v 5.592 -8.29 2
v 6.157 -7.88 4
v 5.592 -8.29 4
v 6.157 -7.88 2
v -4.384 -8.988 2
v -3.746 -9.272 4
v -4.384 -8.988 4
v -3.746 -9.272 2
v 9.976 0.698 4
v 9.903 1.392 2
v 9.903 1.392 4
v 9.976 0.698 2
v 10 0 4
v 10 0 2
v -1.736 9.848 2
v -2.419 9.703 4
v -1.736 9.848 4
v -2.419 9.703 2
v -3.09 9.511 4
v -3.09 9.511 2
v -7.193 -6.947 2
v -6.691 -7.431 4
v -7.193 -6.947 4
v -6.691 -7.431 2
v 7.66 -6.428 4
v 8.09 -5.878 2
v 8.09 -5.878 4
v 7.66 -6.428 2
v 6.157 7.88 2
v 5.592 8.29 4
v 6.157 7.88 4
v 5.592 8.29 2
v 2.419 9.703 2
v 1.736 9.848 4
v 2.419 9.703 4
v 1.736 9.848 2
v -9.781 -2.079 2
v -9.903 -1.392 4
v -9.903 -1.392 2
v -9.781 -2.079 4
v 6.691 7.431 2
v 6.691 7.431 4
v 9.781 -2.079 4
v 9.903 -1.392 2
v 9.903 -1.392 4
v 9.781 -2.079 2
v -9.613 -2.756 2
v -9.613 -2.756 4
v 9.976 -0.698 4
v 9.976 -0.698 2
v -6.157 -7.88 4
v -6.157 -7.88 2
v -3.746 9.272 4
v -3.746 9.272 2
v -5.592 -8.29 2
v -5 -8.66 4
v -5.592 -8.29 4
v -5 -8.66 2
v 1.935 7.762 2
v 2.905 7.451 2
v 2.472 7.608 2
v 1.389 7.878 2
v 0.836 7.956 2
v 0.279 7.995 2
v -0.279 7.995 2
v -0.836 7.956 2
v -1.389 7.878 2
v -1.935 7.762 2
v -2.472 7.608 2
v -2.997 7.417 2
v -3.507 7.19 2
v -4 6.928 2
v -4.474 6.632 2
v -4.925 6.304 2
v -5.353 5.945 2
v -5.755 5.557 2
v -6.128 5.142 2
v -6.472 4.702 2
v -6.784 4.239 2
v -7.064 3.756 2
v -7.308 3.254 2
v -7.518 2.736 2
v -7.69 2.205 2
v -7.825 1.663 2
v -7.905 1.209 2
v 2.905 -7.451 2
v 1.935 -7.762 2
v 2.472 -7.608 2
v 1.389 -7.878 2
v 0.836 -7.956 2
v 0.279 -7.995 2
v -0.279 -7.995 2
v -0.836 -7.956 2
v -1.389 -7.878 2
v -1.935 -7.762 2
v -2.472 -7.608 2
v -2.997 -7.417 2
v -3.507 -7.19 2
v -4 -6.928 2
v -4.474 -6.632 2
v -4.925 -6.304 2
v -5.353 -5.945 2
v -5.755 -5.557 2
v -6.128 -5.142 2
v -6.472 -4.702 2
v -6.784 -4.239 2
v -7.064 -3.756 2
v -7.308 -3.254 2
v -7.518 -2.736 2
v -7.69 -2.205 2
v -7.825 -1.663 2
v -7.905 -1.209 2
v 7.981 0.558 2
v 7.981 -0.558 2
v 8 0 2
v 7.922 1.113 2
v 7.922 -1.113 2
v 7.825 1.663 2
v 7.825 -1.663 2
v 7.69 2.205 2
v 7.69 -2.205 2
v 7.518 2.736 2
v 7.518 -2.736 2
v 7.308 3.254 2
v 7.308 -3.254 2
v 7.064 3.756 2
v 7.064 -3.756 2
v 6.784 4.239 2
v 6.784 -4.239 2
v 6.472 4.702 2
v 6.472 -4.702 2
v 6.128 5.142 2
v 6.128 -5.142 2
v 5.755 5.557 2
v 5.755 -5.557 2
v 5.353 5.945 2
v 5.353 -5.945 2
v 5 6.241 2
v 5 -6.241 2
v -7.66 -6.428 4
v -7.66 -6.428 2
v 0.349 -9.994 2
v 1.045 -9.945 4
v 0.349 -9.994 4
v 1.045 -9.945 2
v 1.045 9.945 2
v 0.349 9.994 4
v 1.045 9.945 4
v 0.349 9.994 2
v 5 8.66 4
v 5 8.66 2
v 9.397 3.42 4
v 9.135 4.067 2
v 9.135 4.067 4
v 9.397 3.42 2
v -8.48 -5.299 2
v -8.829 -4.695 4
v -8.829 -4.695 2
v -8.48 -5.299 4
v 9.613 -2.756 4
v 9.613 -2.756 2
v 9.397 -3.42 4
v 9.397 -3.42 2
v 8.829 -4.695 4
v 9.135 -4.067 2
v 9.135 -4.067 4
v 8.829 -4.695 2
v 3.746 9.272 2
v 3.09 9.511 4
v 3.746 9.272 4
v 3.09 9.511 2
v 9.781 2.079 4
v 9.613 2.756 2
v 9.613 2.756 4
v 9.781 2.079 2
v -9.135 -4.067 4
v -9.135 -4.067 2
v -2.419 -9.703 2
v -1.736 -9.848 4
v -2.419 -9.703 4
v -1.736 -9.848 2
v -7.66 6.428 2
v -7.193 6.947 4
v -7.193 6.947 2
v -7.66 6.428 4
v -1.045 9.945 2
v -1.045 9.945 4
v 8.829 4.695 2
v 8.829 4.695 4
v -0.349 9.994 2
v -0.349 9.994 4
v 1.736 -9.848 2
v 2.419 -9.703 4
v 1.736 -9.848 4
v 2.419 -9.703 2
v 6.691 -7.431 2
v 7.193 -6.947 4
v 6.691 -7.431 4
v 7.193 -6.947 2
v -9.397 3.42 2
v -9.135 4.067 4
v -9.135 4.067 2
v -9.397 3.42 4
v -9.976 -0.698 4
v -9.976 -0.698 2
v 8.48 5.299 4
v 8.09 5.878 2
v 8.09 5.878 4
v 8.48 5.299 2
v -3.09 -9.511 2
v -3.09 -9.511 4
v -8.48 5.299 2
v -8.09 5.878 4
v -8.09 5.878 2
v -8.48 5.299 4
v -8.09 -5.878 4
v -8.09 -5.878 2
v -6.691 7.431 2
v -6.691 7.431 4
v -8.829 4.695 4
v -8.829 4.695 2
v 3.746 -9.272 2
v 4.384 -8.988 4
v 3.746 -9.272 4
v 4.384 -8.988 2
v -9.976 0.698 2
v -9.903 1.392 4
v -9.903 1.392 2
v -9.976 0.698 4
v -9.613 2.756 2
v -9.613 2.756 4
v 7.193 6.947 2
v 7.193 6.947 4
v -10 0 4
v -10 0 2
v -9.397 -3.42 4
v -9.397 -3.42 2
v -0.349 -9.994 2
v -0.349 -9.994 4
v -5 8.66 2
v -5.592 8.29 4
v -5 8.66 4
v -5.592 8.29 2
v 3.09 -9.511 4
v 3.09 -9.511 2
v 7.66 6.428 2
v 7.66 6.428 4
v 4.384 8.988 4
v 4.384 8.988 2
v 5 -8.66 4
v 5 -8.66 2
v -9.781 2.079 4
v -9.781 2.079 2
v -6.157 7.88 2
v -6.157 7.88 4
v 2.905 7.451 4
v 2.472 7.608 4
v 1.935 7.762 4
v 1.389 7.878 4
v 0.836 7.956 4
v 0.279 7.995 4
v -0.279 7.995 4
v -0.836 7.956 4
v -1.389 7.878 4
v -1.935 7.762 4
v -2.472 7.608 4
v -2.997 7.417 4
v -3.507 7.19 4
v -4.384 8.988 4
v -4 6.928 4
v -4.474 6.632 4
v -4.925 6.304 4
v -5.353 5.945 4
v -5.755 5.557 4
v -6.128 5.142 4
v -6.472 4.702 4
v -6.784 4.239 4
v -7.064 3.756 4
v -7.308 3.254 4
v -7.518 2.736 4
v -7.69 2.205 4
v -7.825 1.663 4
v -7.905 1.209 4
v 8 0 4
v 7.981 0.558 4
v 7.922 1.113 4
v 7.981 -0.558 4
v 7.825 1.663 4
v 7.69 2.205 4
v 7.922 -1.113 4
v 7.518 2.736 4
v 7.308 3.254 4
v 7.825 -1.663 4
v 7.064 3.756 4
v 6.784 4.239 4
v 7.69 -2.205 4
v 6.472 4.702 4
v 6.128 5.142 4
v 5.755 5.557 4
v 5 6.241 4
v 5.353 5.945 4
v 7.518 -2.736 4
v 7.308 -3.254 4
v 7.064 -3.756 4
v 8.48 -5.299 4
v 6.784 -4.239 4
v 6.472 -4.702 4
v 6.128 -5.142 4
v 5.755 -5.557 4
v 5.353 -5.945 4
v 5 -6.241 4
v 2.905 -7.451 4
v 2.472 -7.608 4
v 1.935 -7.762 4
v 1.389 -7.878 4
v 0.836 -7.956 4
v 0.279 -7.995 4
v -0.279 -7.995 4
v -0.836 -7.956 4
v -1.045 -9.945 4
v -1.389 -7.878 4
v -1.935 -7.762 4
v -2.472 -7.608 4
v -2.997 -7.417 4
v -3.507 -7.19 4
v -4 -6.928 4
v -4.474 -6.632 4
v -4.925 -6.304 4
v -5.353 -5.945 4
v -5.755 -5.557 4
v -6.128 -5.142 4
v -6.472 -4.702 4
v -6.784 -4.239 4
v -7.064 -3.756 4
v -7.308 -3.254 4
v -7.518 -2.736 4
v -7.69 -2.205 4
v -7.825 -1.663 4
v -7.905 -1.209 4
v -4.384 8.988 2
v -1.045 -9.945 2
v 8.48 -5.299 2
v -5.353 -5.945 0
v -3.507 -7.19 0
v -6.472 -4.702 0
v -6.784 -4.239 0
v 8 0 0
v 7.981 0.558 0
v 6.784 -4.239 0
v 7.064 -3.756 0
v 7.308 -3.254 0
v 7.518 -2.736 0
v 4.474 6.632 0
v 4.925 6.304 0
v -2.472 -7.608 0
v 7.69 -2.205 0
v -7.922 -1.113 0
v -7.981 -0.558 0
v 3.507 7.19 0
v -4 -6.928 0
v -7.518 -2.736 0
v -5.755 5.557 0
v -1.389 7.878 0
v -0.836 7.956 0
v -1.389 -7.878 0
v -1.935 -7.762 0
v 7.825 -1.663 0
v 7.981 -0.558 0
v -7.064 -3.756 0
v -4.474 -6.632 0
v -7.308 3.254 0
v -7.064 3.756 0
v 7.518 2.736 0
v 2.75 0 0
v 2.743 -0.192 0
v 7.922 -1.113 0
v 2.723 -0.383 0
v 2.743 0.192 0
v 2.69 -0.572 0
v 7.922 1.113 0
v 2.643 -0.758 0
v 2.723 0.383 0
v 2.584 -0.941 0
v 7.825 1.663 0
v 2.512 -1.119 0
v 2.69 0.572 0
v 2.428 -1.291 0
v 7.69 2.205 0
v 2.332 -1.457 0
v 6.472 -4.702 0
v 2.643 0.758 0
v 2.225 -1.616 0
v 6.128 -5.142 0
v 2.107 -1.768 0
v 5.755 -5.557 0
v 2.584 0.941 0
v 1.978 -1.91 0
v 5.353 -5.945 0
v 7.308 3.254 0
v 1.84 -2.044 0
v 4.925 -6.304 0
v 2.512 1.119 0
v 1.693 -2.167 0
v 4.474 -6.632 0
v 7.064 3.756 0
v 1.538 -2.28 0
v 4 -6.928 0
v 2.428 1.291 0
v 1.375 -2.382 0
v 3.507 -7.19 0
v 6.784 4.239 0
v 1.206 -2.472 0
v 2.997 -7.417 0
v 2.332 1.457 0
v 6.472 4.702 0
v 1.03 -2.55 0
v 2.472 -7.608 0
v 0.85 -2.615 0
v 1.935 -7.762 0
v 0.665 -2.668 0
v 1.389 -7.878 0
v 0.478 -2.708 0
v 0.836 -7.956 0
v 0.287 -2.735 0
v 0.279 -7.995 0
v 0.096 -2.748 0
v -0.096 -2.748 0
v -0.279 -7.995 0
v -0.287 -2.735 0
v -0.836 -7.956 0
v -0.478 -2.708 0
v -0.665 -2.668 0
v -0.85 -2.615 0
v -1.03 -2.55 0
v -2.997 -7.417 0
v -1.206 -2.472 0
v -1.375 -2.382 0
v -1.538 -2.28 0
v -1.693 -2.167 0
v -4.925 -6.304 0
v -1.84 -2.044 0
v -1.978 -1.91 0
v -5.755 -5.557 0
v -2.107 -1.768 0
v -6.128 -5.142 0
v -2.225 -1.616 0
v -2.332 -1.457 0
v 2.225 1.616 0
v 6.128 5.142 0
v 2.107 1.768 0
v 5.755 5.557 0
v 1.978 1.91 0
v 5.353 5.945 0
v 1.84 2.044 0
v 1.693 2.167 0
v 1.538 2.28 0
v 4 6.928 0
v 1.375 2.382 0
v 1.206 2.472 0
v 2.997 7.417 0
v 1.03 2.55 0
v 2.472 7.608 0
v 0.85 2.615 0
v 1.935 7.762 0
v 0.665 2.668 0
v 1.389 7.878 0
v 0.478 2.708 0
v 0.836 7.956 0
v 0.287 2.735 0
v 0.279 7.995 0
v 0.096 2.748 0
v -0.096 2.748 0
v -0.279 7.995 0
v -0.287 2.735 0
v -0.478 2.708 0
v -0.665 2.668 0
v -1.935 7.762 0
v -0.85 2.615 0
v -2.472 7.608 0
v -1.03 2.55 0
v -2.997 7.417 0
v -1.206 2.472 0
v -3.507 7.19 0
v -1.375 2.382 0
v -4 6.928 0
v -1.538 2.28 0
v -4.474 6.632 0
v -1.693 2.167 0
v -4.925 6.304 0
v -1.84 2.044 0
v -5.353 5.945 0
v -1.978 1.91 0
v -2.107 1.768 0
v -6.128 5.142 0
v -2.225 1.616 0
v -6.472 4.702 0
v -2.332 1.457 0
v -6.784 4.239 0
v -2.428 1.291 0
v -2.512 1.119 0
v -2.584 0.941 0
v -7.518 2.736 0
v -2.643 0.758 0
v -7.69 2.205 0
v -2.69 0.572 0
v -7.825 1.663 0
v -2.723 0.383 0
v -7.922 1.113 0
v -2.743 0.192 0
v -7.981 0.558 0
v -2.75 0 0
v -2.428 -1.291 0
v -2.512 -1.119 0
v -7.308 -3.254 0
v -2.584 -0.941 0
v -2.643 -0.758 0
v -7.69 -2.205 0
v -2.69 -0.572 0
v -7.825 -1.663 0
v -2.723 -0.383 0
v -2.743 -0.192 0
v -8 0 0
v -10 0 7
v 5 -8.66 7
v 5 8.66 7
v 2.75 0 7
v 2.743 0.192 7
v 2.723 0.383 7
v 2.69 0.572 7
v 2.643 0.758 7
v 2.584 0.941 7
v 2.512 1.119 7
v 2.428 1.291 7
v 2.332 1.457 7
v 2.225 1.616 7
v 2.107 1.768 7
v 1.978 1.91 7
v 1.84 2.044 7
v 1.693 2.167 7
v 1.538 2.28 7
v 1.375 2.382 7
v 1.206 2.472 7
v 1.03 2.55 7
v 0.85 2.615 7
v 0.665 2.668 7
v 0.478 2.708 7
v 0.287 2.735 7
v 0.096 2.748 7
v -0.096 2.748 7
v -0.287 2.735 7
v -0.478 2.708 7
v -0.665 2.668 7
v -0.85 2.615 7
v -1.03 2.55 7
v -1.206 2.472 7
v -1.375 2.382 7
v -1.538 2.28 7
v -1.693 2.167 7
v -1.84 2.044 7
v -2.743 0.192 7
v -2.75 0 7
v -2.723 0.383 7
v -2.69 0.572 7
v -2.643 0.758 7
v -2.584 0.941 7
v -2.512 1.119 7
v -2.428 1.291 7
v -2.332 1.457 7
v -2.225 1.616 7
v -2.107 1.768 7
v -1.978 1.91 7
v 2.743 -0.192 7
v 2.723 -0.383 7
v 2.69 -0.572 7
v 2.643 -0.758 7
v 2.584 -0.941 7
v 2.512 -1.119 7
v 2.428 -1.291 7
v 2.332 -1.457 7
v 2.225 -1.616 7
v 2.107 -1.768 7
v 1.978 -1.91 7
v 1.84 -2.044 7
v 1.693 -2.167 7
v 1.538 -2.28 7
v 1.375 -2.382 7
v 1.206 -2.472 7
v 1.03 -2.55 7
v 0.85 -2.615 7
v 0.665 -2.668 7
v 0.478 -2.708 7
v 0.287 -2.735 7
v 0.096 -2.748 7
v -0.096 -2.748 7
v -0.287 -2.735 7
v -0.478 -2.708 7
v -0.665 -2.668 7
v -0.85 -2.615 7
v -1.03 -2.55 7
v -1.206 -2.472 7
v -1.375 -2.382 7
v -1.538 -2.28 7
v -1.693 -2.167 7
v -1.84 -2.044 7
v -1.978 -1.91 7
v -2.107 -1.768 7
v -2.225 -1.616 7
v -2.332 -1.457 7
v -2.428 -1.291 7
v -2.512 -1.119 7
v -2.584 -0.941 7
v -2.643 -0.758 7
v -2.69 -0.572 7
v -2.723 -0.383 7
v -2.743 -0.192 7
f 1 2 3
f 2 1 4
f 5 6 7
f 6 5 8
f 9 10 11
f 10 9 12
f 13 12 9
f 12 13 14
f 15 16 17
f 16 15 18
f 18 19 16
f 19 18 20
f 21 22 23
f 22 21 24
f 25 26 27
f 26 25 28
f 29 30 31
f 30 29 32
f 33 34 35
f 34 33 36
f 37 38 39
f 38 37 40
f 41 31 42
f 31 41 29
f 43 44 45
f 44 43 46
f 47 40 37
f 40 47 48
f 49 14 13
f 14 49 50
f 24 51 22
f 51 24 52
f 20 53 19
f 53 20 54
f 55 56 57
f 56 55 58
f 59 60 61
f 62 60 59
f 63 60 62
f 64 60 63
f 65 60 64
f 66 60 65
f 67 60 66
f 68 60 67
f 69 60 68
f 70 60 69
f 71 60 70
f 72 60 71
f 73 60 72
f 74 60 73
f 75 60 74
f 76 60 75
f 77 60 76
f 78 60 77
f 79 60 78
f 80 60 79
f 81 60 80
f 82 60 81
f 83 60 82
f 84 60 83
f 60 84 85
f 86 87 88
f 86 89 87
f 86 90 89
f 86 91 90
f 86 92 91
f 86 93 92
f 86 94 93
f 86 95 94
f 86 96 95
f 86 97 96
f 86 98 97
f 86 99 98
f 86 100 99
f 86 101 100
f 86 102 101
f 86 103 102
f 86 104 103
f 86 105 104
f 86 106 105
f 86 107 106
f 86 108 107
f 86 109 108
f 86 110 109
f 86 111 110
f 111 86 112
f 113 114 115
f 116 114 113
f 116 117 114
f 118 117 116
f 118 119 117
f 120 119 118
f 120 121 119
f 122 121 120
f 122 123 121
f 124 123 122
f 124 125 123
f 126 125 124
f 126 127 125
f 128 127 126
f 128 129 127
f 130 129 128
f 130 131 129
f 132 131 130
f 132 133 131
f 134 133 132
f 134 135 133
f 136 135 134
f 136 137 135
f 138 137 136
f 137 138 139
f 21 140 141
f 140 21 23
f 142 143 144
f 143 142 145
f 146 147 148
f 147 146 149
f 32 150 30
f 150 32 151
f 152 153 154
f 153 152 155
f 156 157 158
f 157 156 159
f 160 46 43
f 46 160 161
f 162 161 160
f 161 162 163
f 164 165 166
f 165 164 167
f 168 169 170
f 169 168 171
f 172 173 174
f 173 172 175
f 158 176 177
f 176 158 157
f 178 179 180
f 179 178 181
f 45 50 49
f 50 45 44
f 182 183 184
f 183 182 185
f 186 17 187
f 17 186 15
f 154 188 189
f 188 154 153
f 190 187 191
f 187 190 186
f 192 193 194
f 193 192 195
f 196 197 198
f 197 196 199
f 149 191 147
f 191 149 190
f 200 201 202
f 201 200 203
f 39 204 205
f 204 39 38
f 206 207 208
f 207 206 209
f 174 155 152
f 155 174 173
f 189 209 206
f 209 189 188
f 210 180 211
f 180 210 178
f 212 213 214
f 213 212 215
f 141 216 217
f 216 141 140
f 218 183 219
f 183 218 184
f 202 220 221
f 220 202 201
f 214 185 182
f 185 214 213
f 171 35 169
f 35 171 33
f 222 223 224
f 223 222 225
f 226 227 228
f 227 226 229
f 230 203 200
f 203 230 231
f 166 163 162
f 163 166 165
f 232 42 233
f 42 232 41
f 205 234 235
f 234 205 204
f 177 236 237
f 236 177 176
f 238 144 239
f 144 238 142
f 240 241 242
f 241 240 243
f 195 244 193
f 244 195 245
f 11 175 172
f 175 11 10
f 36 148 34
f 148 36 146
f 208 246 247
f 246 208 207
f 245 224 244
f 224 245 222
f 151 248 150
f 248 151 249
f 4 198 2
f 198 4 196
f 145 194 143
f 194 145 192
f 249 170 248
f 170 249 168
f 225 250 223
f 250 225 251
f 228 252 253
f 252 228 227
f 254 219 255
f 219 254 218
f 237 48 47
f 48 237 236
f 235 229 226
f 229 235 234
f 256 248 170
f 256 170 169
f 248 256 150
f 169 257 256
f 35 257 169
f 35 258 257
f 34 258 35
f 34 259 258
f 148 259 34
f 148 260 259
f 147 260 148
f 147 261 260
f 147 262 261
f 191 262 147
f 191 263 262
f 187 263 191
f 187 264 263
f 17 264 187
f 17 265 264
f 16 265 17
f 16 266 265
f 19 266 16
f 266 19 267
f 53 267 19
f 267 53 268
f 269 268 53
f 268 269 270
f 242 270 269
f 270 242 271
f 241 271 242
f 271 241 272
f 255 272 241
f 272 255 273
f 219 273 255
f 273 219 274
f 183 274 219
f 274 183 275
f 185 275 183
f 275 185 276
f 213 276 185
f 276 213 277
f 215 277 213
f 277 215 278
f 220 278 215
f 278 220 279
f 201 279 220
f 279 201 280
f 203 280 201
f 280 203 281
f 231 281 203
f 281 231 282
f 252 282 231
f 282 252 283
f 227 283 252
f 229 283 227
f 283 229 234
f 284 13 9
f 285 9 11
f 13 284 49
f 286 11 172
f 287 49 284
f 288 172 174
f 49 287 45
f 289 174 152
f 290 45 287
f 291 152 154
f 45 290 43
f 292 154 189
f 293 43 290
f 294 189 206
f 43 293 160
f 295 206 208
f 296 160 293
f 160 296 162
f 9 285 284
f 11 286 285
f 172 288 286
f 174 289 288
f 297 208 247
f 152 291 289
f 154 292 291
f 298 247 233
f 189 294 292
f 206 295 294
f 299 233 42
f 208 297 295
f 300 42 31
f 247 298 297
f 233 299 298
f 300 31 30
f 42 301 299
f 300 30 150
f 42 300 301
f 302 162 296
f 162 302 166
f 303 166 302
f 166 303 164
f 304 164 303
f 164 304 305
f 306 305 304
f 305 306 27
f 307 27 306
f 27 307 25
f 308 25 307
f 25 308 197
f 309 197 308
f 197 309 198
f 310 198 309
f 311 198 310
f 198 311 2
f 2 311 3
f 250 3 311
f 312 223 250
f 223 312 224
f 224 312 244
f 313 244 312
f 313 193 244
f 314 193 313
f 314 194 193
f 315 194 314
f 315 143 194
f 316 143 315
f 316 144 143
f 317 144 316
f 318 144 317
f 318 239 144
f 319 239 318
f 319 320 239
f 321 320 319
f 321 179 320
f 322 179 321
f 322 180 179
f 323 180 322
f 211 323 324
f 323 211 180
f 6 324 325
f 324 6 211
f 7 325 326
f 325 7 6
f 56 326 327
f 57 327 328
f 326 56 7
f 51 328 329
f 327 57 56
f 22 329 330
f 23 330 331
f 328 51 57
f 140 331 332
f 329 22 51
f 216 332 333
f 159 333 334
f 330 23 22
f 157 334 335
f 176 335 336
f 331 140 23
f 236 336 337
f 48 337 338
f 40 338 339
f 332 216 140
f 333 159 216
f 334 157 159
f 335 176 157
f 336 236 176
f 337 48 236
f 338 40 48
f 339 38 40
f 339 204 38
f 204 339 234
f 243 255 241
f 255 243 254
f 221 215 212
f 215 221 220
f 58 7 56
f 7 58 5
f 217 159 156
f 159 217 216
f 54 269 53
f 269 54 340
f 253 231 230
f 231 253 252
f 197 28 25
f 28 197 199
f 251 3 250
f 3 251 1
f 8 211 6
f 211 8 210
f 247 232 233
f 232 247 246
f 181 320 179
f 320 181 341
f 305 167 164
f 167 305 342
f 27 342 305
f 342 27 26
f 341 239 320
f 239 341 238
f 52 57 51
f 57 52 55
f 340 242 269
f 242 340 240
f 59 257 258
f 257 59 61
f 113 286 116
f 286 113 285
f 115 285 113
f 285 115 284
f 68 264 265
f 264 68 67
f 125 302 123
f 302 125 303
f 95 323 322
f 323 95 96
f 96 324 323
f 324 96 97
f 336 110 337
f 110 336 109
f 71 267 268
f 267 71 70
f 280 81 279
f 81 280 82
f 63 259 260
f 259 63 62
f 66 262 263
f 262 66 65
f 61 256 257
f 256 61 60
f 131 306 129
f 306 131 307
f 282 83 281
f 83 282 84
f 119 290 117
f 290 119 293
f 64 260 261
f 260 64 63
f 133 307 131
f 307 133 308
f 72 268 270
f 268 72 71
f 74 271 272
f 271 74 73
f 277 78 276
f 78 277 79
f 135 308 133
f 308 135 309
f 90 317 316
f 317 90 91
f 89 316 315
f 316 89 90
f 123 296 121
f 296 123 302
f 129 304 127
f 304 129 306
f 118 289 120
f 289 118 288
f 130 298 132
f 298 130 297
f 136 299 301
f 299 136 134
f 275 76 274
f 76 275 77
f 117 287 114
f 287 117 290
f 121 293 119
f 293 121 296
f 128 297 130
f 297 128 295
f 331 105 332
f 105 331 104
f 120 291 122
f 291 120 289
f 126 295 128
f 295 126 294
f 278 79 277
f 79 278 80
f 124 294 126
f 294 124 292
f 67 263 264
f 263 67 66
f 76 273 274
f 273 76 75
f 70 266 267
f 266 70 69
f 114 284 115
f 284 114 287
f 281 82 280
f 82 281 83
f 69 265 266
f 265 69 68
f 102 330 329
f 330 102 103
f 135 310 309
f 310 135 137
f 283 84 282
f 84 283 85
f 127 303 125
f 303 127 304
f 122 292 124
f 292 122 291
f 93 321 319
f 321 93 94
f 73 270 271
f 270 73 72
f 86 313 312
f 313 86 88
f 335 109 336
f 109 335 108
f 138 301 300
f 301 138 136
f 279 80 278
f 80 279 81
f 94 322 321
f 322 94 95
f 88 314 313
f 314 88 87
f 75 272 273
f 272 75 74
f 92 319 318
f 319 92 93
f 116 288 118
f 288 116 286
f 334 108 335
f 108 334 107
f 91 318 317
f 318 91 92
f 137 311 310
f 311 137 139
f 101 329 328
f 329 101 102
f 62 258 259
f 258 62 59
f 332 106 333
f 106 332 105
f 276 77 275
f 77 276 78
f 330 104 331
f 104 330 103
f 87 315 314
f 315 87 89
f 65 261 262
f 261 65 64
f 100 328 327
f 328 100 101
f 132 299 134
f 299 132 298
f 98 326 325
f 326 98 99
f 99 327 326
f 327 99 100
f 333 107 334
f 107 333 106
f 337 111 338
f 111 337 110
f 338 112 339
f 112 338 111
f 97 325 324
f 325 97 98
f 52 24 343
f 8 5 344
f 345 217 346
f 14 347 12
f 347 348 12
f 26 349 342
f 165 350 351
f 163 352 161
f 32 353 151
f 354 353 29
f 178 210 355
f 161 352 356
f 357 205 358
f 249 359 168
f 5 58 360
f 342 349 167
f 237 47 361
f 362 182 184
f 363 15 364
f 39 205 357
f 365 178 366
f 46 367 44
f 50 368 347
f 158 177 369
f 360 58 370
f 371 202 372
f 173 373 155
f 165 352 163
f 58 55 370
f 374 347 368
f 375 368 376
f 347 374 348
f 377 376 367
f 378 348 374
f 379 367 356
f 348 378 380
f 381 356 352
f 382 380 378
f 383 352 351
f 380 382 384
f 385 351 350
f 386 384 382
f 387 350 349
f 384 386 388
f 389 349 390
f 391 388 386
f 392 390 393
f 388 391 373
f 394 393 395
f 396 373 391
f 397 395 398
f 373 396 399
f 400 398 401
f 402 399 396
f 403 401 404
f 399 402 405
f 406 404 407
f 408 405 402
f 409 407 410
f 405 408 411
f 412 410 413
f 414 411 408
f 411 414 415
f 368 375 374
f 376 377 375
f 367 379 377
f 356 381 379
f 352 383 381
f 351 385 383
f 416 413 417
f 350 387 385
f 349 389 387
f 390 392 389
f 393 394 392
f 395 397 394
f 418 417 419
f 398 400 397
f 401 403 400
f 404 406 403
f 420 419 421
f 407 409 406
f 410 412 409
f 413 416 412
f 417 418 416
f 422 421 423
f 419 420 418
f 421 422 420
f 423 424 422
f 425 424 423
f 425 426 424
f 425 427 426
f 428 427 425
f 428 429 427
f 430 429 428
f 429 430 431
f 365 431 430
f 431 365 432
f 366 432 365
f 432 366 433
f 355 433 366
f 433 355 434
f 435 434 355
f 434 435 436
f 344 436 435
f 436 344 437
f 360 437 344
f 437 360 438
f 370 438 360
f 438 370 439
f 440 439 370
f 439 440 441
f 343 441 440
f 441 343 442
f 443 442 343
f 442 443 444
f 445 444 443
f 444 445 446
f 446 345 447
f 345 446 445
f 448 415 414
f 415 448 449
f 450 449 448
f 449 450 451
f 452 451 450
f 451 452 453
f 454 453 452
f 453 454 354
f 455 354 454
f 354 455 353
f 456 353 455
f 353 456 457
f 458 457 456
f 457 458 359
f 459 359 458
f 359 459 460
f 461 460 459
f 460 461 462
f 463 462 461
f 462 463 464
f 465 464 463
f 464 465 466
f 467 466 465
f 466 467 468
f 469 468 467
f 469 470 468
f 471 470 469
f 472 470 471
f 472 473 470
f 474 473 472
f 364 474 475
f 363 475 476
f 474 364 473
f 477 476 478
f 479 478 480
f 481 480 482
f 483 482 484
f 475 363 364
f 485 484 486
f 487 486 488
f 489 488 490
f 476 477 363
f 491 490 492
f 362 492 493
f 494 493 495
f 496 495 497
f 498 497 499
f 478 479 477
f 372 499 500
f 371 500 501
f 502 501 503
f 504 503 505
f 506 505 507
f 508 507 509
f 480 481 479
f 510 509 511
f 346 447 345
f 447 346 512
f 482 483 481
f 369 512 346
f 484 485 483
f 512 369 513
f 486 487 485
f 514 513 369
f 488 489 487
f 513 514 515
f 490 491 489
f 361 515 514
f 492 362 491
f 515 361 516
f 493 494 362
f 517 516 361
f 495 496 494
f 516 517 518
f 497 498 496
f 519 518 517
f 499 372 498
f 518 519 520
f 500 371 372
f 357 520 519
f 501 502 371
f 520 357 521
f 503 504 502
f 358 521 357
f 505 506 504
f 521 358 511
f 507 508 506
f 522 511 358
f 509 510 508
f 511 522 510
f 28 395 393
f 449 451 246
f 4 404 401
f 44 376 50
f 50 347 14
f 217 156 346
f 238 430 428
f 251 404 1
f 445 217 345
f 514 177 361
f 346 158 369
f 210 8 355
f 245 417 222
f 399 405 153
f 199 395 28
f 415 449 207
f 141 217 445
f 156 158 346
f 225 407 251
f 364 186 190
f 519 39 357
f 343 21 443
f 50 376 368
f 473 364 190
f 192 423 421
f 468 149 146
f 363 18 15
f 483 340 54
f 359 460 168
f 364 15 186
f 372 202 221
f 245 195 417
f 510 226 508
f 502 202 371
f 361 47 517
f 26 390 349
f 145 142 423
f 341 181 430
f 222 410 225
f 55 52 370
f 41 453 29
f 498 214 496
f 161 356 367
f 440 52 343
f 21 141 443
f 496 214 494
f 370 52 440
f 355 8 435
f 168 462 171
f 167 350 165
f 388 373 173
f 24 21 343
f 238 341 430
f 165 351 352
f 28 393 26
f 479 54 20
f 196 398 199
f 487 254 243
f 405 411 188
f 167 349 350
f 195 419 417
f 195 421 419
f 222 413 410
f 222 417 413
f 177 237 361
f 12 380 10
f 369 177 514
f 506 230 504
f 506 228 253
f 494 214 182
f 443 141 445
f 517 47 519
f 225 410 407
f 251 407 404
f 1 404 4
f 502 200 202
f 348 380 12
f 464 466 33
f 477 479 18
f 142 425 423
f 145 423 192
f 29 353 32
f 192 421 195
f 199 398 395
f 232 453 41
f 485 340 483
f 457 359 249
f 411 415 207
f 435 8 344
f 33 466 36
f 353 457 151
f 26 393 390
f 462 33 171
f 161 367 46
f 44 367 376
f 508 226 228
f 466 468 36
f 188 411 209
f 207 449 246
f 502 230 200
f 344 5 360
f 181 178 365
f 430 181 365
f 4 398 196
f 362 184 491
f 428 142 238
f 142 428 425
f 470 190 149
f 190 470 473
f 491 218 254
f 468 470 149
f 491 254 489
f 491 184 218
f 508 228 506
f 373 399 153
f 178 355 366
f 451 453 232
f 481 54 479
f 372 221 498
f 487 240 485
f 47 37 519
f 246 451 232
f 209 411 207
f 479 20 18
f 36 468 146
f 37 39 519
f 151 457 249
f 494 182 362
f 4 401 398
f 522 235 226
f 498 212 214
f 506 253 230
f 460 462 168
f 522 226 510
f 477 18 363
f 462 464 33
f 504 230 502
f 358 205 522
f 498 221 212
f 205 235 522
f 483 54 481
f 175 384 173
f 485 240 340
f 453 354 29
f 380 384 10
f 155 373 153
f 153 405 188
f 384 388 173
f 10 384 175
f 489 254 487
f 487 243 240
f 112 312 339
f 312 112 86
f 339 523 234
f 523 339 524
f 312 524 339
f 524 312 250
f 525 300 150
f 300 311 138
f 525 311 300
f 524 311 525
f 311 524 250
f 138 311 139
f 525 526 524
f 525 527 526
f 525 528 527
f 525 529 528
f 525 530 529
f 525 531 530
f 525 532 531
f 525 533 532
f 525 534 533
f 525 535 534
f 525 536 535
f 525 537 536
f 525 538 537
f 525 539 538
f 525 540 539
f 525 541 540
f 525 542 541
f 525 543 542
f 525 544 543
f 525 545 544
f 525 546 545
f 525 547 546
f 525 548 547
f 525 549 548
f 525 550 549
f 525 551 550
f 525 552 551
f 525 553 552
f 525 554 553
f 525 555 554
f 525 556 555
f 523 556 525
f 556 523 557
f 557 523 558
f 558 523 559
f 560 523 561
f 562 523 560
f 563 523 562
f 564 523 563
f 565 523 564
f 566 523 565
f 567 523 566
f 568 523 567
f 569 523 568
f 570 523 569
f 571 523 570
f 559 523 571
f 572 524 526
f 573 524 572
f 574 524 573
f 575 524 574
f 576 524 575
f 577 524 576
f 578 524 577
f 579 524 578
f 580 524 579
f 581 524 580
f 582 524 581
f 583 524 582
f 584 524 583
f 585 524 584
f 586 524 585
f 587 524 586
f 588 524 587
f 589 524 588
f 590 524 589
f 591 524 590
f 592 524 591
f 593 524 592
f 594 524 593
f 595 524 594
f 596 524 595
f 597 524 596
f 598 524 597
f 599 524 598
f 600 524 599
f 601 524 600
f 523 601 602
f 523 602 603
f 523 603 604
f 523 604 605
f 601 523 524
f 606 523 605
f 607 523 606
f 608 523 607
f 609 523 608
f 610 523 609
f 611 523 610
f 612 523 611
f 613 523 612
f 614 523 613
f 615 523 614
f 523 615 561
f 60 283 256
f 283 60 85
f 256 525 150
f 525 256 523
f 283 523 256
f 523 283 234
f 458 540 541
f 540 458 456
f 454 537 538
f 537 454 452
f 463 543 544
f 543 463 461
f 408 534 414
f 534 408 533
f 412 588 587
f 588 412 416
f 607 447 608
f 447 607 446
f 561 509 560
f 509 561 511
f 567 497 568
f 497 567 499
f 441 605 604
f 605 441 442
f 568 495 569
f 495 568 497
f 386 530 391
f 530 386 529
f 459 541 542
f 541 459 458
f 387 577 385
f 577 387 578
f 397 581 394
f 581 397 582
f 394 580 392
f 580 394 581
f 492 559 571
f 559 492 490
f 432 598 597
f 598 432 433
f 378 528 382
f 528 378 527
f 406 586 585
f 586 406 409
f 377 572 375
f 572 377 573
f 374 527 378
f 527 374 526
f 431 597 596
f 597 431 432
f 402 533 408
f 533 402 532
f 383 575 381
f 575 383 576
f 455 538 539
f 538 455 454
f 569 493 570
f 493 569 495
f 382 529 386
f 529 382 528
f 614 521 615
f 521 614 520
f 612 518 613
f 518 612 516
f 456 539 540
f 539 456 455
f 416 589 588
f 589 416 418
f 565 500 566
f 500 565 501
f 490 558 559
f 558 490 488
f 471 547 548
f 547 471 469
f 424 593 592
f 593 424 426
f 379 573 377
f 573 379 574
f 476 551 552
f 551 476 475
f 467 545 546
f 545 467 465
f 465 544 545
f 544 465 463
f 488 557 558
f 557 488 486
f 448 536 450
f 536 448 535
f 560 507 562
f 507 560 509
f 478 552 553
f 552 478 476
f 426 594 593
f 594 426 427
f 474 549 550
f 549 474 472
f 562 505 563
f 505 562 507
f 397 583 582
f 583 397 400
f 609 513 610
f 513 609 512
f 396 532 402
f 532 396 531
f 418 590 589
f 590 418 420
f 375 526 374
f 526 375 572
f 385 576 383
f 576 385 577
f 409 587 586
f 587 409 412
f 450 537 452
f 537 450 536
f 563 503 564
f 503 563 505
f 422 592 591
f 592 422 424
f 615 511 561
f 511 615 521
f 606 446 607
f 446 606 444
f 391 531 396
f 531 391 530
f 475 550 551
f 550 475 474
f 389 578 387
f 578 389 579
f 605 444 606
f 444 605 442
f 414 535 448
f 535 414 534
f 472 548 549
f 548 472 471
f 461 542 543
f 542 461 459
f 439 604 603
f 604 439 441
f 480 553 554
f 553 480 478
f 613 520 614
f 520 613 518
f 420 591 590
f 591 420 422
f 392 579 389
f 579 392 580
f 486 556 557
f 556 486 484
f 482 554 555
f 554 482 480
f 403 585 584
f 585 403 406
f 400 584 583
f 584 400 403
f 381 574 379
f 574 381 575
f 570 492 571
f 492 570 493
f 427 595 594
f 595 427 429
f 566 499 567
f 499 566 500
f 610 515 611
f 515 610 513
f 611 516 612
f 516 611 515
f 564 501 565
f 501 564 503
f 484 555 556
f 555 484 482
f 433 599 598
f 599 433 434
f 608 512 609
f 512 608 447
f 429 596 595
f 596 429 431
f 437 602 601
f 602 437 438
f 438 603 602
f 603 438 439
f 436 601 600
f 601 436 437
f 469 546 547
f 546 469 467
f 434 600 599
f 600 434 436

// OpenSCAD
/* 
Soar Brushless motor three blade propeller
12/15/14


Uses module to create the three parts in the same script
*/

/*****************Parameters***************/

//basecap
res=90; // cylinder resolution

basecapR1=26.5/2; //matches diameter of propeller motor=26.5
basecapR2=10;
basecapBase=2;
basecapAl=6.4;// 5.8 measured
basecapRem=0.8; //inner radius of Al adapter wing corners
basecapAlRin=19.1/2; //diameter of Al adapter 19
basecapRemOffset=4.5;
baseCube=8;
baseCubeHei=5;
clearanceHole=5.5/2; //M5 bolt 5.5mm for clearance

retainThick=2;
retainWallHei=2;

//topcap

topcapR2=basecapR2;
topcapBase=2; //m5 by 19mm bolt, 7mm for threading into nosecone, 2mm basecap, 10mm blade, 2mm on topcap 
topCube=baseCube;
topCubeHei=baseCubeHei;
topBoltHei=1;
topcapR1=16/2;// base diameter of threaded nose cone

//blade
bladeCylOut=basecapR2;
bladeCylHei=10;
bladeCube=baseCube+.2; //.2 is for slight over extrude
bladeCylIn=bladeCylOut-retainThick-.2;//.2 for slight overextrude
bladeCylInHei=retainWallHei-.2;
propRad=31;  //radius of propeller 31mm for brushless
bladeTwist=7; //twist of blade from hub to outerrim, twist is the is the difference of bladeTwist and startAngle, follows left hand rule
startAngle=25;
avgAngle=(startAngle+(startAngle-bladeTwist/2))/2; 
nSlices=20; //20 has been good for printing
bladeScale=3.3; //amount of growth of blade moving out from the hub
bladeThick=1.3; //thickness of fin, 1.3mm had been strong enough
bladeWidth=4; // starting blade width at origin

/**********end parameters*************/




/*****uncomment the part you would like to render***/

//basecap();
topcap();
//3blade();




/*********module for basecap**************/

module basecap (){
//cone
difference(){
union(){
	intersection(){
	// base section that fits over Aluminum adapter
	translate([0,0,-basecapAl])
	cylinder(r1=basecapR1, r2=(2*basecapR1+basecapR2)/3, h=basecapAl, $fn=res);
for ( i = [0 : 2] )
{
    rotate( i * 360 / 3, [0, 0, 1])
translate([basecapRemOffset,basecapRemOffset,-basecapAl])
minkowski(){
	cylinder(r=basecapRem, h=basecapAl/2, $fn=res);
	cube([basecapR1, basecapR1, basecapAl/2]);
}//end of minkowski
}// end of for loop
}	// end of intersection making tabs to fit around Al adapter
//ring for wrapping around AL base
difference(){
translate([0,0,-basecapAl])
cylinder(r1=basecapR1, r2=(2*basecapR1+basecapR2)/3, h=basecapAl, $fn=res);
translate([0,0,-basecapAl-.01])
cylinder(r=basecapAlRin, h=basecapAl+.02, $fn=res);
}

//create taper to retaining ring
		cylinder(r1=(2*basecapR1+basecapR2)/3, r2=basecapR2, h=basecapBase, $fn=res);

//blade retaining ring
difference(){
translate([0,0,basecapBase])
cylinder(r=basecapR2, h=retainWallHei, $fn=res);
translate([0,0,basecapBase-.01])
cylinder(r=basecapR2-retainThick, h=retainWallHei+.02, $fn=res);
}
//lockcube
translate([0,0,basecapBase])
linear_extrude(height = baseCubeHei, convexity = 10)
polygon(points=[[basecapR2*sin(30),basecapR2*cos(30)],[-basecapR2,0],[basecapR2*sin(30),-basecapR2*cos(30)]]);
} // end union

//bolthole
translate([0,0,-basecapAl-.01])
cylinder(r=clearanceHole, h=basecapBase+baseCubeHei+basecapAl+.02, $fn=res);
} // end difference 
}//end of modulus basecap

/*********module for topcap**************/

module topcap (){

difference(){
union(){
	
//base cone
		cylinder(r1=topcapR1, r2=topcapR2, h=topcapBase, $fn=res);
//retaining ring		
difference(){
translate([0,0,topcapBase])
cylinder(r=topcapR2, h=retainWallHei, $fn=res);
translate([0,0,topcapBase-.01])
cylinder(r=topcapR2-retainThick, h=retainWallHei+.02, $fn=res);
}
//locking cube
translate([0,0,topcapBase])
linear_extrude(height = topCubeHei, convexity = 10)
polygon(points=[[topcapR2*sin(30),topcapR2*cos(30)],[-topcapR2,0],[topcapR2*sin(30),-topcapR2*cos(30)]]);
}//end union
//bolt hole
translate([0,0,-.01])
cylinder(r=clearanceHole, h=topcapBase+topCubeHei+.02, $fn=res);
}
}//end of modulus topcap

/****** module for 3blade*************/

module 3blade () {
difference(){
	union(){
	//creates inner cylinder that locks into end and top cap
	cylinder(r=bladeCylIn, h=bladeCylHei, $fn=res);
	//creates middle hub
	translate([0,0,bladeCylInHei])
	cylinder(r=bladeCylOut, h=bladeCylHei-2*bladeCylInHei, $fn=res);

//create the propeller blades
	intersection(){
		translate([0,0,bladeCylHei/2])
		rotate([90,90-startAngle,90]) 
		linear_extrude(height=propRad, convexity=10, twist=bladeTwist, slices=nSlices, scale=[1,bladeScale])
		scale([.8*bladeThick/bladeWidth,1,1]) 
		circle(r = bladeWidth,$fn=res); //blade profile is a scaled circle


	cylinder(h=bladeCylHei, r=propRad, $fn=res);
	}//end intersection - intersection between this cylinder and the blades gives the blades the rounded ends

}//end of union of cylinder and fin blade

	//makes it a partial base to interlock
	translate([-2*bladeCylOut+bladeCylOut*sin(30)+.2,-bladeCylOut-.1,-.10])
	cube([2*bladeCylOut,bladeCylOut*2+.2,bladeCylHei+.2]);

}//end of difference
}// end of 3blade module
